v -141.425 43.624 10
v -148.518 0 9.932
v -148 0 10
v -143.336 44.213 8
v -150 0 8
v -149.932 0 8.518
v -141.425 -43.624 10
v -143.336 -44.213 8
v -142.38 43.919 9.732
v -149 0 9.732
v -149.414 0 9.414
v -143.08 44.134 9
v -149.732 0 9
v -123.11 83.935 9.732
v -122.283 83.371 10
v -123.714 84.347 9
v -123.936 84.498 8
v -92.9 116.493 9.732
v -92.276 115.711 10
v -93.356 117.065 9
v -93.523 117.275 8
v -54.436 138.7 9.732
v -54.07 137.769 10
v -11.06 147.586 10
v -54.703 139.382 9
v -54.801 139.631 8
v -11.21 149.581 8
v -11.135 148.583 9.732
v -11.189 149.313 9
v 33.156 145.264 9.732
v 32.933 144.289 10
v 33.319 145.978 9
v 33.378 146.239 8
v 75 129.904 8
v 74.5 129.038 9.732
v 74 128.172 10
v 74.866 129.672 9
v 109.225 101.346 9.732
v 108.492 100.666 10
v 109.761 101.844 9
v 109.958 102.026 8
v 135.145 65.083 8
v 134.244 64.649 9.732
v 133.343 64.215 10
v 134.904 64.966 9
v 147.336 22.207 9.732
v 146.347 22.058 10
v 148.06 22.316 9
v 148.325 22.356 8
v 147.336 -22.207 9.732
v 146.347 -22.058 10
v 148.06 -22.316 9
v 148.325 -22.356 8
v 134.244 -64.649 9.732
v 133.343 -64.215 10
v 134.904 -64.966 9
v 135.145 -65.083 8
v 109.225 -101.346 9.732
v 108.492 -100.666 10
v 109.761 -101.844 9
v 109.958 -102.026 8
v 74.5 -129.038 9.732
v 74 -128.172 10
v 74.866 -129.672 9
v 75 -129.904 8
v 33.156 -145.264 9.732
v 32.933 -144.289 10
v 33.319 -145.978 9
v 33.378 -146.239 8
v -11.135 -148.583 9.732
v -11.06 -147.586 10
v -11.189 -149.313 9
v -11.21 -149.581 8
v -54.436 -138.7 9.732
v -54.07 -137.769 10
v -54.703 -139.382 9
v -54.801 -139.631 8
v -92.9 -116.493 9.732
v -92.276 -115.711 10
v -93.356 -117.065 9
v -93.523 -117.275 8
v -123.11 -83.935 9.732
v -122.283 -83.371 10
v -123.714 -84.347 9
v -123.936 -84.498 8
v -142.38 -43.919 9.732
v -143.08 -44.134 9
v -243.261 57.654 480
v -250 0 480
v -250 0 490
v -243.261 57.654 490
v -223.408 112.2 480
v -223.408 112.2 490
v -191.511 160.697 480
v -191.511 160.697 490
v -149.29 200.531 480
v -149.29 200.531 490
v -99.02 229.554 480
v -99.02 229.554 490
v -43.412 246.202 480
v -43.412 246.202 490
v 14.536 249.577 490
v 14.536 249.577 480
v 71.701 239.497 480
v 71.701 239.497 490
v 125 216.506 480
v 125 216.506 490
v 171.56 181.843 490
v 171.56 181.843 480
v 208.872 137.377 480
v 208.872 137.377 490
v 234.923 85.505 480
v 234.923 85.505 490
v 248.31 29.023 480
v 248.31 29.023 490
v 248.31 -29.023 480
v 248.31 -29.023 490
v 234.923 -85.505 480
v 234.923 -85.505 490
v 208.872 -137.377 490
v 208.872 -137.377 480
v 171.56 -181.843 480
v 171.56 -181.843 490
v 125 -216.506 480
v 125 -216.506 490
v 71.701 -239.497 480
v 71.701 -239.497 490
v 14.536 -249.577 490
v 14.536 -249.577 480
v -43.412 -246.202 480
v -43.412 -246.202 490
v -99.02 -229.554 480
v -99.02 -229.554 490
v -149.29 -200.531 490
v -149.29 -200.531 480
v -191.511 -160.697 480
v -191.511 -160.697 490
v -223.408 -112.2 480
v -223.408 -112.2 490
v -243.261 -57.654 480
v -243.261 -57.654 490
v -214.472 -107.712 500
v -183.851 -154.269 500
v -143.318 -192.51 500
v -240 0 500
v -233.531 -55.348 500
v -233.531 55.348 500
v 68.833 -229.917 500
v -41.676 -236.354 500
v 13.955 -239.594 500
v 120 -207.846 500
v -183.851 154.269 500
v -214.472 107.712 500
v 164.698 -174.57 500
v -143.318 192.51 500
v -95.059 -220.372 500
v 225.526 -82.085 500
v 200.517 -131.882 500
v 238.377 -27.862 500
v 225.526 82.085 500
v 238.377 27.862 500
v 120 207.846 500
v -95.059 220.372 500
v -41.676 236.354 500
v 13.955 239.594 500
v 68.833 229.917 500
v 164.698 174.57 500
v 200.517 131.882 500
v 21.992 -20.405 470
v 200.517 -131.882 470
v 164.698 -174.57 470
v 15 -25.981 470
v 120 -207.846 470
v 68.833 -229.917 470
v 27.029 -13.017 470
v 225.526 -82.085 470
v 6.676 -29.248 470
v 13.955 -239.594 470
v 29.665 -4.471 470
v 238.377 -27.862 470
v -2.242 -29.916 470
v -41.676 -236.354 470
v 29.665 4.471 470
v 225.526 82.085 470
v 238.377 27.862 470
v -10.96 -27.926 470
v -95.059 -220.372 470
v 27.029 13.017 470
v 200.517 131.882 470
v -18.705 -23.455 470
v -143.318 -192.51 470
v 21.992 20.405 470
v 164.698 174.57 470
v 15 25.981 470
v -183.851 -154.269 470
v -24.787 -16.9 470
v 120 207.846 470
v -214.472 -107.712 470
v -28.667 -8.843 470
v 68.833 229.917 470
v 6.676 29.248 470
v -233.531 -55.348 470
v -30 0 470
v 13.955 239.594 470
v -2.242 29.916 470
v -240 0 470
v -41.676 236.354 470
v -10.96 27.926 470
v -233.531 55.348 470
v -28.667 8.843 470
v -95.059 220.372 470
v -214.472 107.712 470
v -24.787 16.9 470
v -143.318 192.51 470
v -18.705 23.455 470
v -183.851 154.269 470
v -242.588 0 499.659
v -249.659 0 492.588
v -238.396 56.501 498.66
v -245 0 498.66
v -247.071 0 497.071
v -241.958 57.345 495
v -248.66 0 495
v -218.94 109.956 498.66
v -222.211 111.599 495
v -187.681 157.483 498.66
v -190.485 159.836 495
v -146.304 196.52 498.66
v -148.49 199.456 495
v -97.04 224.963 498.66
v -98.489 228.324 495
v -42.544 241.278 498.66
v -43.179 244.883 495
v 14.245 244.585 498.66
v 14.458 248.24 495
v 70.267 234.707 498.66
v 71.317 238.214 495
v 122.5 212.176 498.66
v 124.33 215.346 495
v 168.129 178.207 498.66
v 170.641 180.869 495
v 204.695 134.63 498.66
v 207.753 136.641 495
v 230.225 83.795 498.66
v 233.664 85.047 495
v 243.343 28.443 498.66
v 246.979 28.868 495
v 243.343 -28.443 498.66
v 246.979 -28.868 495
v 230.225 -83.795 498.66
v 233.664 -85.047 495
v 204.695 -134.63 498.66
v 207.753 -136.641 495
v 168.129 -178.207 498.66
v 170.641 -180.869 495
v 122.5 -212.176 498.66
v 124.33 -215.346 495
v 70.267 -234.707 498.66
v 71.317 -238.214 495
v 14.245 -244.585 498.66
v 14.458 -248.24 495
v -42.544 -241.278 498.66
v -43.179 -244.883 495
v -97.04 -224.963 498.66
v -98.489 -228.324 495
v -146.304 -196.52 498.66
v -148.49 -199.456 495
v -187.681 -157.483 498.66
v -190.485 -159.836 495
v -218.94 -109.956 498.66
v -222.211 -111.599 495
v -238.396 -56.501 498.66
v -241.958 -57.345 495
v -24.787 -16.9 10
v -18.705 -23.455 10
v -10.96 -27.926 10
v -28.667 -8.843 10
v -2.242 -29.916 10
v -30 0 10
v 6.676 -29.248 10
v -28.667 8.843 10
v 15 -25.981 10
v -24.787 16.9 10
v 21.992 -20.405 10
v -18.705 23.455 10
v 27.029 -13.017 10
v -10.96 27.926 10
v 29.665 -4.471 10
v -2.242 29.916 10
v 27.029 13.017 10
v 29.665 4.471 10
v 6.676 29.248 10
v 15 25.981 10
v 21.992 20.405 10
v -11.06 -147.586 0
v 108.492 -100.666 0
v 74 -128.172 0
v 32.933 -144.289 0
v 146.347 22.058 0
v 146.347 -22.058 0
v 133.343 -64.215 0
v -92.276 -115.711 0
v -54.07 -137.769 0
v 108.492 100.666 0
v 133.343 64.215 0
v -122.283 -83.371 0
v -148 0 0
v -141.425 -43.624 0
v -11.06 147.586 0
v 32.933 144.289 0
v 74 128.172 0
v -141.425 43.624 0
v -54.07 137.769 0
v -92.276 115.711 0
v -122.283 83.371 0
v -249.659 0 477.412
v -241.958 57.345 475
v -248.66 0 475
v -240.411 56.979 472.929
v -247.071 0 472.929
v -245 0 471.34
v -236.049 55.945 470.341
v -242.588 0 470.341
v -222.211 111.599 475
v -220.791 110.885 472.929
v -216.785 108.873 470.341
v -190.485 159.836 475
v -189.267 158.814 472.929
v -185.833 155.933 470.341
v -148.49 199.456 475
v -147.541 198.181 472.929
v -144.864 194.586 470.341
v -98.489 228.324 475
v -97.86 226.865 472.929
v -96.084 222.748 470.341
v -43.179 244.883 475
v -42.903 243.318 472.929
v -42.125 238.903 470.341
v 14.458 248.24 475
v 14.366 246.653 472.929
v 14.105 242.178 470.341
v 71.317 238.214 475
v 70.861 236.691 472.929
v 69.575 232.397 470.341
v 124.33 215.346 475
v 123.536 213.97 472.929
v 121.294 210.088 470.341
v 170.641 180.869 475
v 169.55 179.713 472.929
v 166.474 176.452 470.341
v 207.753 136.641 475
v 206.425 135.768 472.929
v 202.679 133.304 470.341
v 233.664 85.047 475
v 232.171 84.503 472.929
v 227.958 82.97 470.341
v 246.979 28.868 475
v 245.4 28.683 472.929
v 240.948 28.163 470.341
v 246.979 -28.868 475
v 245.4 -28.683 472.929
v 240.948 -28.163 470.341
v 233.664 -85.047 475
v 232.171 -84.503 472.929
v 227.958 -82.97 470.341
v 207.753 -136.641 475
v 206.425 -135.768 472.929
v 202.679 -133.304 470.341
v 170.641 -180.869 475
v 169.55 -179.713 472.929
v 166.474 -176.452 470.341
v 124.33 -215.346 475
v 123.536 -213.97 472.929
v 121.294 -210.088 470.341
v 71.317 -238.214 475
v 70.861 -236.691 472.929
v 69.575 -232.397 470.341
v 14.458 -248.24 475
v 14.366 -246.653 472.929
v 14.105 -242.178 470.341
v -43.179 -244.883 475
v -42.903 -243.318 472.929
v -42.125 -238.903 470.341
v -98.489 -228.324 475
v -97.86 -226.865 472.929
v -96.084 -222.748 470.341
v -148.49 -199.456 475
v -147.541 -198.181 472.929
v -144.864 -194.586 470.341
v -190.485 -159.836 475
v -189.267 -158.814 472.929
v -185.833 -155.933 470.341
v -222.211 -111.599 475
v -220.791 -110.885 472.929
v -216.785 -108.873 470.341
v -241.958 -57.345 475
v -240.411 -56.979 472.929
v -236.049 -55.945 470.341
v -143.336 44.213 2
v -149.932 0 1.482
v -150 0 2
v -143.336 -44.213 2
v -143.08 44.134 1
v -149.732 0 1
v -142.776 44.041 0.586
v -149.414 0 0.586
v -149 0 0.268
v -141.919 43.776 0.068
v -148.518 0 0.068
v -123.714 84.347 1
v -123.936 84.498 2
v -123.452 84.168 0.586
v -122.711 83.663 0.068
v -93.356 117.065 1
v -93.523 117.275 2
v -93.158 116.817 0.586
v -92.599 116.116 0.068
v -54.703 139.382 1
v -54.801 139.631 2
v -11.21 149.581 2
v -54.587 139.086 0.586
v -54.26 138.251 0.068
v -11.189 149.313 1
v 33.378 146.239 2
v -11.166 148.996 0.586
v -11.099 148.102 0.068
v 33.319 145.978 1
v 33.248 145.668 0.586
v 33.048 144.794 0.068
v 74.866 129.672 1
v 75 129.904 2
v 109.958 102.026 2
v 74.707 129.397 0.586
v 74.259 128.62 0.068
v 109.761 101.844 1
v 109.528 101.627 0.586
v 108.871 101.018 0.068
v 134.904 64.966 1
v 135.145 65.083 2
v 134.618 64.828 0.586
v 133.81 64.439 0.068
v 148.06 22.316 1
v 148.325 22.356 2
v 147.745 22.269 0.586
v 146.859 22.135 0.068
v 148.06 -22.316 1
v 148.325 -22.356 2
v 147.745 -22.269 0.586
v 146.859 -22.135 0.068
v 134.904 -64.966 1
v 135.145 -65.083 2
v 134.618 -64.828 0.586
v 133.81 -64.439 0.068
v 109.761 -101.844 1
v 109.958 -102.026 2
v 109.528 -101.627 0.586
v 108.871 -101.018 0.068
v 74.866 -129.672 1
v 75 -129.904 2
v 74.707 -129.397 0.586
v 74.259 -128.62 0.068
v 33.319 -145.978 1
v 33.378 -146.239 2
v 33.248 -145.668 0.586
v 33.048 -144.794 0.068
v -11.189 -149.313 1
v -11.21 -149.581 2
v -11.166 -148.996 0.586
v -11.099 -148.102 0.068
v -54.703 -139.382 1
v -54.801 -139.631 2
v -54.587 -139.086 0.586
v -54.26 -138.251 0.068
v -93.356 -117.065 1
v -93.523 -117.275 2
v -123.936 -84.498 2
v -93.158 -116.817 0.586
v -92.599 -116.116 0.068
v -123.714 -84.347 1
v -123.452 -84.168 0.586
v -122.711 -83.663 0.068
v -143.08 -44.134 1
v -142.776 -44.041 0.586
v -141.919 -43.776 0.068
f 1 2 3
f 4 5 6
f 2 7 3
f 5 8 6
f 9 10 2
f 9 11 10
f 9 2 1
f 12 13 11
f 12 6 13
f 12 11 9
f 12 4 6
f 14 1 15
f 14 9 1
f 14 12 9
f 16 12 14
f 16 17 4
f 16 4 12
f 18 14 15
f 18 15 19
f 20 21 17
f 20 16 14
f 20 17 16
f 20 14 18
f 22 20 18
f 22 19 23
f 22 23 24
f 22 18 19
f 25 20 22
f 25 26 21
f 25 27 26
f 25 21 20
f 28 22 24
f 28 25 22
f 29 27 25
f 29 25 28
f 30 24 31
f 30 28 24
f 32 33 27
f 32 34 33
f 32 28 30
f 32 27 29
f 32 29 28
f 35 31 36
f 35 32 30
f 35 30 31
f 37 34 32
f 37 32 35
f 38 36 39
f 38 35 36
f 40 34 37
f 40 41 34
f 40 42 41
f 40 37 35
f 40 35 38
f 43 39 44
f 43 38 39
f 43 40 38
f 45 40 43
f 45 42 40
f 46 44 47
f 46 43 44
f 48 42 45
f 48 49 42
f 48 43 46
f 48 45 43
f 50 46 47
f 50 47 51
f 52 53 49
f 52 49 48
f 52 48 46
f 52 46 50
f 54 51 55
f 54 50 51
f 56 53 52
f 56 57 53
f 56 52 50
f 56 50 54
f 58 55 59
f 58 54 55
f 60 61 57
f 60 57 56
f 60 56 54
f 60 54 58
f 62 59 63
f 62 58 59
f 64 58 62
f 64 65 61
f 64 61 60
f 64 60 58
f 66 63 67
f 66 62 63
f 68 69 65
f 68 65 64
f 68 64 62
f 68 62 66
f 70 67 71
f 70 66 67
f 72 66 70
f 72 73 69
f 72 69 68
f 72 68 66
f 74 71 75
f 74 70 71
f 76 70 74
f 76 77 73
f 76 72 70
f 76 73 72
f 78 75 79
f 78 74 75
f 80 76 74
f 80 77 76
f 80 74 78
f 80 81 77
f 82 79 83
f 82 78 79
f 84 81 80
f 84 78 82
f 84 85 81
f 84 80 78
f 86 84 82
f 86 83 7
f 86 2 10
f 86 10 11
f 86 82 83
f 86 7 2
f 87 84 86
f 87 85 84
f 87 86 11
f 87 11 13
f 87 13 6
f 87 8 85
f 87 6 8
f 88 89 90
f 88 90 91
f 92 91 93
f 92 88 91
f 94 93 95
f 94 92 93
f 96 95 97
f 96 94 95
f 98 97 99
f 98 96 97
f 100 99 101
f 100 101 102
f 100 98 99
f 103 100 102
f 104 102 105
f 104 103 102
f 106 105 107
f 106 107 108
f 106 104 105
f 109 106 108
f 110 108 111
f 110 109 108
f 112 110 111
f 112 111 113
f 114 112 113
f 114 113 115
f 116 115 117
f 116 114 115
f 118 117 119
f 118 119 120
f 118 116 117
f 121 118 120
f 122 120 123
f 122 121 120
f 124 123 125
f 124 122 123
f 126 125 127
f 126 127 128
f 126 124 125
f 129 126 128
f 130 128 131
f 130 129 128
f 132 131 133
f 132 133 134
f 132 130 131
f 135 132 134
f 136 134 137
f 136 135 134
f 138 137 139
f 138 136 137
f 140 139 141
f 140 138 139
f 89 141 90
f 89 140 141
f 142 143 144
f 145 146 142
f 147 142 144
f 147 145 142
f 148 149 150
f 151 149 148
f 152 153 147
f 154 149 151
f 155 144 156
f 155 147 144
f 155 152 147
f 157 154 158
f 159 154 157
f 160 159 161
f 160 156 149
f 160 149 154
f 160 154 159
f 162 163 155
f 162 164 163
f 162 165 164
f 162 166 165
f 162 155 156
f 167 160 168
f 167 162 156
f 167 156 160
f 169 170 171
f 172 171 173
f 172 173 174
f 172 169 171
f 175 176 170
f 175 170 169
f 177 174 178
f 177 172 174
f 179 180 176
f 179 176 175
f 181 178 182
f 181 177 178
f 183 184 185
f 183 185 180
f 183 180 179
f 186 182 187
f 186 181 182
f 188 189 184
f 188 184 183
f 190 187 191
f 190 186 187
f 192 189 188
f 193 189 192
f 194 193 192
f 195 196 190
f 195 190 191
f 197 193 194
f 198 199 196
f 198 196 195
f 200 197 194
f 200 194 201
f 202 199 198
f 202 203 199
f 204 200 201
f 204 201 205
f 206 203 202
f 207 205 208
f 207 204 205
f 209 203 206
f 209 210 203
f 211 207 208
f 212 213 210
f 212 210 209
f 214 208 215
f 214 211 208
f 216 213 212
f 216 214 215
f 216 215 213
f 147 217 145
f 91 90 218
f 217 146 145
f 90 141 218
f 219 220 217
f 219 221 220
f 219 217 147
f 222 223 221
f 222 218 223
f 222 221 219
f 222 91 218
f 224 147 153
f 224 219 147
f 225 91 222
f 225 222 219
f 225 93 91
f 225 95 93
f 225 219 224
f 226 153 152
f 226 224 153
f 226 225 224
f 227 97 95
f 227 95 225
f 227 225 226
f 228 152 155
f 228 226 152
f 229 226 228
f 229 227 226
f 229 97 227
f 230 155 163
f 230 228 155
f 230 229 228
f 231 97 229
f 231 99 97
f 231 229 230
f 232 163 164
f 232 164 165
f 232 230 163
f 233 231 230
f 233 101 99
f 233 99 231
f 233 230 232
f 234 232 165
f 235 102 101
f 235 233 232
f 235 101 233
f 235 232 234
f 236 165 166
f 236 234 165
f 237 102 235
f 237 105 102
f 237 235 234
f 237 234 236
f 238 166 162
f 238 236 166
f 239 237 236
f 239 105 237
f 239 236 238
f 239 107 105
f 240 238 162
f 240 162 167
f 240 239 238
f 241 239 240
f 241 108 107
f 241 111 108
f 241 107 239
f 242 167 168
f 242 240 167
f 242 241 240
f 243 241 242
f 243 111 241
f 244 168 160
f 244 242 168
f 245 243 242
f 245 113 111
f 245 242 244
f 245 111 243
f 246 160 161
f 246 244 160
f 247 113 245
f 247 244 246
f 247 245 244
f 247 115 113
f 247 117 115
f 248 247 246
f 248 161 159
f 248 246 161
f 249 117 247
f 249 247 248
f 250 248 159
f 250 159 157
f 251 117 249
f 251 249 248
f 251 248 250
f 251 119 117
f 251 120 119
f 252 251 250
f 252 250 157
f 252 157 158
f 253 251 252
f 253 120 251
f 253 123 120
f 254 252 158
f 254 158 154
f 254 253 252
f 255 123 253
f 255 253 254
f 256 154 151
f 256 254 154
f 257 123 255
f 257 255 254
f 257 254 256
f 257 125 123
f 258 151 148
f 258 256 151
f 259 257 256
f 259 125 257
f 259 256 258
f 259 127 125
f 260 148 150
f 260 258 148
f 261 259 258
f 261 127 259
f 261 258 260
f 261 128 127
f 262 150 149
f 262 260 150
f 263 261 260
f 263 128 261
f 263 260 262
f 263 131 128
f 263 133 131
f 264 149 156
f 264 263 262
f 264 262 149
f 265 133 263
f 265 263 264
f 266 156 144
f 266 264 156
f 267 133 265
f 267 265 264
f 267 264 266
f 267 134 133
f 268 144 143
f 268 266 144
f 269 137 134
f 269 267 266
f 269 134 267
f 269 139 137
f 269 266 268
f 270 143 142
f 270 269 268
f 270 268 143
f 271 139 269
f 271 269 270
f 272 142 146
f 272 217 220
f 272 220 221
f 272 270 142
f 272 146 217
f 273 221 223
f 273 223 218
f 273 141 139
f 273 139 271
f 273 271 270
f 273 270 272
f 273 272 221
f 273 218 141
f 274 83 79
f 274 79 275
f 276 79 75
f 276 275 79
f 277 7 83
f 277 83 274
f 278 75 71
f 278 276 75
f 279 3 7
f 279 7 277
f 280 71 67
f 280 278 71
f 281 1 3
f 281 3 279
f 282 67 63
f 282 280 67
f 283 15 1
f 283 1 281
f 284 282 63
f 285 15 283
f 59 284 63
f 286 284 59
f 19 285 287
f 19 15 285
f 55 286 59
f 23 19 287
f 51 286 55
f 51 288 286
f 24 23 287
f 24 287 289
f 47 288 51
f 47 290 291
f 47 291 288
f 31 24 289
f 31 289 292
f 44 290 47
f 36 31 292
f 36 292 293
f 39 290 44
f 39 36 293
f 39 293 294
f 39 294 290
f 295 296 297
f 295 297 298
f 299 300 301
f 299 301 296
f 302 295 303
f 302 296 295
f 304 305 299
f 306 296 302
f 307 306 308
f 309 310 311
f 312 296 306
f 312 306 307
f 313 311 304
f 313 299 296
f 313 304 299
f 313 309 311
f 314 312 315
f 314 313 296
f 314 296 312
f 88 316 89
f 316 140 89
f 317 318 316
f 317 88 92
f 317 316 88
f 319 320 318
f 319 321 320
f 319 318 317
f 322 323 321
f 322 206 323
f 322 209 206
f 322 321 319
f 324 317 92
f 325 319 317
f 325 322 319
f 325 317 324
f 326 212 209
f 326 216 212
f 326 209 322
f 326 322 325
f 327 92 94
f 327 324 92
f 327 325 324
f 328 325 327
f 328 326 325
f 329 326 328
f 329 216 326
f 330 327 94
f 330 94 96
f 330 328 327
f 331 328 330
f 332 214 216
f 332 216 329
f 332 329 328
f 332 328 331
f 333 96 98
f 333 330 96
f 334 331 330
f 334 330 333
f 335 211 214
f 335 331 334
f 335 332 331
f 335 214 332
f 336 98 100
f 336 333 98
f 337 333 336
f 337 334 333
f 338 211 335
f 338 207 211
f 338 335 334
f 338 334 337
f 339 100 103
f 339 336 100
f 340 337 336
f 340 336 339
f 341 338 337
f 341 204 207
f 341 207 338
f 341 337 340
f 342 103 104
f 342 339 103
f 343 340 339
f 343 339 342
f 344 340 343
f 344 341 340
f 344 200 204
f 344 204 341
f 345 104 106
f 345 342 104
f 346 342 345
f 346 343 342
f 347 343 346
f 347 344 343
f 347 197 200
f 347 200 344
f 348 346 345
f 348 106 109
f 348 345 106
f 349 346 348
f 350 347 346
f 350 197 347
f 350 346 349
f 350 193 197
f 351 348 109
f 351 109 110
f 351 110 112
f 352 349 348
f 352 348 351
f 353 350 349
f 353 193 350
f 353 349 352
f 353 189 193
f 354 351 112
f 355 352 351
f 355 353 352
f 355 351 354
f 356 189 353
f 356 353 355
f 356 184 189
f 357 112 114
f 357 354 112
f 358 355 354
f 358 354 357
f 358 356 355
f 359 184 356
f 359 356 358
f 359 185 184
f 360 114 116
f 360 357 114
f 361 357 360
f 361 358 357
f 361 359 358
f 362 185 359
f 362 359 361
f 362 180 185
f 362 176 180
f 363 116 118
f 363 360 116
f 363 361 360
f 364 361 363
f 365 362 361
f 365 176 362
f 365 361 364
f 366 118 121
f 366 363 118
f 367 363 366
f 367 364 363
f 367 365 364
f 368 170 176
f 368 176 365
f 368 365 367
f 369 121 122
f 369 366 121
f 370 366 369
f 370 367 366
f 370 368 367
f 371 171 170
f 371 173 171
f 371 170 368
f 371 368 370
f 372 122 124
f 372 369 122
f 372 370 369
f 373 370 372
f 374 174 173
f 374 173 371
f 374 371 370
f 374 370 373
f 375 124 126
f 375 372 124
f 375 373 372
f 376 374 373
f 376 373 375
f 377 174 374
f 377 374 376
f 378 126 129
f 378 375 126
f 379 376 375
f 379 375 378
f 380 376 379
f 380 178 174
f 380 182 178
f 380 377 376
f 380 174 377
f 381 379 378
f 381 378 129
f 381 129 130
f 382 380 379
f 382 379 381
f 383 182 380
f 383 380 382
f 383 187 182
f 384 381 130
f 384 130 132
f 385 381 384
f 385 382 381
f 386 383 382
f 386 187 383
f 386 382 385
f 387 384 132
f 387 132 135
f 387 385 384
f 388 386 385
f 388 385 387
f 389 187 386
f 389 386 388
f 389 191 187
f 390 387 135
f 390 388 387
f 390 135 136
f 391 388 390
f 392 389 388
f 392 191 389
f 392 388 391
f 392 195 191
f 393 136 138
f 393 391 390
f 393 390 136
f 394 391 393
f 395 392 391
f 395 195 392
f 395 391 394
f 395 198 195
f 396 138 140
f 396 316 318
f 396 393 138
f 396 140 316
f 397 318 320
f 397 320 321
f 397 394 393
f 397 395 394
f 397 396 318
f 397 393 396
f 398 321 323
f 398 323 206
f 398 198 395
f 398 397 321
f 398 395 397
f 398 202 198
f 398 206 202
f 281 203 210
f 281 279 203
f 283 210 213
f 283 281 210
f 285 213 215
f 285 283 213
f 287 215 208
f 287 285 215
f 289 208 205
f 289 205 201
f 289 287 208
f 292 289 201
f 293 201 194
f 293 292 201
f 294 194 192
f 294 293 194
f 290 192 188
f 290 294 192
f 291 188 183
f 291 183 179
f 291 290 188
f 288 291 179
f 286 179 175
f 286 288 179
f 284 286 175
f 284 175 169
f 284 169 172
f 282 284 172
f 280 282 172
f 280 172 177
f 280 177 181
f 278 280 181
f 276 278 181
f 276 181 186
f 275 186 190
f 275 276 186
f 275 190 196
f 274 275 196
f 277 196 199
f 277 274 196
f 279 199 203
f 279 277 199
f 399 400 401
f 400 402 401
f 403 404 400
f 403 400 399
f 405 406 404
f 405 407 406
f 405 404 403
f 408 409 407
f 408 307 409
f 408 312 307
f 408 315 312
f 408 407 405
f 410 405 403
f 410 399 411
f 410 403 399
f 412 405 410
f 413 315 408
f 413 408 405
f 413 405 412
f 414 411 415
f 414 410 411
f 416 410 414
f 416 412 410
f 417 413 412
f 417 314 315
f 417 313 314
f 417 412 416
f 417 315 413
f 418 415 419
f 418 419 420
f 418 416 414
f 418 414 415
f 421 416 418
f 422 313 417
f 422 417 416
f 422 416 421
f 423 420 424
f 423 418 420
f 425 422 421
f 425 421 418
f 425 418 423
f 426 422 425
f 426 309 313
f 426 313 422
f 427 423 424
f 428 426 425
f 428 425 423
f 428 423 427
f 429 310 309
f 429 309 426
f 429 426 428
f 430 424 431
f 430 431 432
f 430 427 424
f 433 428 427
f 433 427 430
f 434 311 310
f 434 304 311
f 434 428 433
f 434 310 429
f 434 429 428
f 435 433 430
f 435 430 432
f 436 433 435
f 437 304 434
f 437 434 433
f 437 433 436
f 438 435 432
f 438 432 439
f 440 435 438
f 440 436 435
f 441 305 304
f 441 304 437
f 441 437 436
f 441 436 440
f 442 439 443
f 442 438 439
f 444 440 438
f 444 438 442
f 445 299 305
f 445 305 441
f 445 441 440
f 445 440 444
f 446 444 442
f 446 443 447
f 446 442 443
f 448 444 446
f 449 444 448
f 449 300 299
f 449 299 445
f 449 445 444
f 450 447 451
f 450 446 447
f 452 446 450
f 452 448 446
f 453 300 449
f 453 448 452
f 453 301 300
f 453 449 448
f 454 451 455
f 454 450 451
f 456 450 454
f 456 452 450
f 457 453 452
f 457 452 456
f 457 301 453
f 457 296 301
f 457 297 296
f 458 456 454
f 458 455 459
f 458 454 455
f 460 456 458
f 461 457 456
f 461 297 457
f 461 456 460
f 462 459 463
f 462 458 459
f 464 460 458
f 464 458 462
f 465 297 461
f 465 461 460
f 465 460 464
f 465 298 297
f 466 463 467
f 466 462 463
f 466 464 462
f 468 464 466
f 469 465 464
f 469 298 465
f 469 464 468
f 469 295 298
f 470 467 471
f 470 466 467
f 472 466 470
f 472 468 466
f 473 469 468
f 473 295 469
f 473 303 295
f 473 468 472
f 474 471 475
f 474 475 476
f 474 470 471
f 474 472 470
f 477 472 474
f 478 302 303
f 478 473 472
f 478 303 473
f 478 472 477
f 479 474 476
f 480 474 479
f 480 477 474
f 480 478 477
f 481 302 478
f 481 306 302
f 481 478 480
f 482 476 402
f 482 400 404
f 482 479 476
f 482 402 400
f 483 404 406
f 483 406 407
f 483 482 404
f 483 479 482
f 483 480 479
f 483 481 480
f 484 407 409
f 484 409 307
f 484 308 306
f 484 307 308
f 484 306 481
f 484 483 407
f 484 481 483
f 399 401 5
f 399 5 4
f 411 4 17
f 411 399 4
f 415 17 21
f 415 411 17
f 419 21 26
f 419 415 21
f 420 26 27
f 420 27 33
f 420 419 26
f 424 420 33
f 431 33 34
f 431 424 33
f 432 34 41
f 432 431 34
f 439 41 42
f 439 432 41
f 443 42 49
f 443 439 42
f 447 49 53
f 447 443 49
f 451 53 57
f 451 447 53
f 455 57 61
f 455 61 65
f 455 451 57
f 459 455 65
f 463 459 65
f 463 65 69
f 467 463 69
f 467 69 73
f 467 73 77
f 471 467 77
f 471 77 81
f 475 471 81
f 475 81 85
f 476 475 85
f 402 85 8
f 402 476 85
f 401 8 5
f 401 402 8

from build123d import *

# Parameters (mm, degrees)
F2_R = 10
F3_R = 2


with BuildPart() as f1:
    # F0 (on Front) → F1 (revolve)
    with BuildSketch(Plane.XZ):
        Polygon((-150, 0), (0, 0), (0, 500), (-250, 500), (-250, 470), (-30, 470), (-30, 10), (-150, 10), align=None)
    revolve(axis=Axis((0, 0, 250), (0, 0, -1)))

    # F2
    f2_edges = [f1.edges().sort_by_distance(p)[0] for p in [
        (250, 0, 500),
        (250, 0, 470),
    ]]
    fillet(f2_edges, radius=F2_R)

    # F3
    f3_edges = [f1.edges().sort_by_distance(p)[0] for p in [
        (150, 0, 0),
        (150, 0, 10),
    ]]
    fillet(f3_edges, radius=F3_R)


solid = f1.part
